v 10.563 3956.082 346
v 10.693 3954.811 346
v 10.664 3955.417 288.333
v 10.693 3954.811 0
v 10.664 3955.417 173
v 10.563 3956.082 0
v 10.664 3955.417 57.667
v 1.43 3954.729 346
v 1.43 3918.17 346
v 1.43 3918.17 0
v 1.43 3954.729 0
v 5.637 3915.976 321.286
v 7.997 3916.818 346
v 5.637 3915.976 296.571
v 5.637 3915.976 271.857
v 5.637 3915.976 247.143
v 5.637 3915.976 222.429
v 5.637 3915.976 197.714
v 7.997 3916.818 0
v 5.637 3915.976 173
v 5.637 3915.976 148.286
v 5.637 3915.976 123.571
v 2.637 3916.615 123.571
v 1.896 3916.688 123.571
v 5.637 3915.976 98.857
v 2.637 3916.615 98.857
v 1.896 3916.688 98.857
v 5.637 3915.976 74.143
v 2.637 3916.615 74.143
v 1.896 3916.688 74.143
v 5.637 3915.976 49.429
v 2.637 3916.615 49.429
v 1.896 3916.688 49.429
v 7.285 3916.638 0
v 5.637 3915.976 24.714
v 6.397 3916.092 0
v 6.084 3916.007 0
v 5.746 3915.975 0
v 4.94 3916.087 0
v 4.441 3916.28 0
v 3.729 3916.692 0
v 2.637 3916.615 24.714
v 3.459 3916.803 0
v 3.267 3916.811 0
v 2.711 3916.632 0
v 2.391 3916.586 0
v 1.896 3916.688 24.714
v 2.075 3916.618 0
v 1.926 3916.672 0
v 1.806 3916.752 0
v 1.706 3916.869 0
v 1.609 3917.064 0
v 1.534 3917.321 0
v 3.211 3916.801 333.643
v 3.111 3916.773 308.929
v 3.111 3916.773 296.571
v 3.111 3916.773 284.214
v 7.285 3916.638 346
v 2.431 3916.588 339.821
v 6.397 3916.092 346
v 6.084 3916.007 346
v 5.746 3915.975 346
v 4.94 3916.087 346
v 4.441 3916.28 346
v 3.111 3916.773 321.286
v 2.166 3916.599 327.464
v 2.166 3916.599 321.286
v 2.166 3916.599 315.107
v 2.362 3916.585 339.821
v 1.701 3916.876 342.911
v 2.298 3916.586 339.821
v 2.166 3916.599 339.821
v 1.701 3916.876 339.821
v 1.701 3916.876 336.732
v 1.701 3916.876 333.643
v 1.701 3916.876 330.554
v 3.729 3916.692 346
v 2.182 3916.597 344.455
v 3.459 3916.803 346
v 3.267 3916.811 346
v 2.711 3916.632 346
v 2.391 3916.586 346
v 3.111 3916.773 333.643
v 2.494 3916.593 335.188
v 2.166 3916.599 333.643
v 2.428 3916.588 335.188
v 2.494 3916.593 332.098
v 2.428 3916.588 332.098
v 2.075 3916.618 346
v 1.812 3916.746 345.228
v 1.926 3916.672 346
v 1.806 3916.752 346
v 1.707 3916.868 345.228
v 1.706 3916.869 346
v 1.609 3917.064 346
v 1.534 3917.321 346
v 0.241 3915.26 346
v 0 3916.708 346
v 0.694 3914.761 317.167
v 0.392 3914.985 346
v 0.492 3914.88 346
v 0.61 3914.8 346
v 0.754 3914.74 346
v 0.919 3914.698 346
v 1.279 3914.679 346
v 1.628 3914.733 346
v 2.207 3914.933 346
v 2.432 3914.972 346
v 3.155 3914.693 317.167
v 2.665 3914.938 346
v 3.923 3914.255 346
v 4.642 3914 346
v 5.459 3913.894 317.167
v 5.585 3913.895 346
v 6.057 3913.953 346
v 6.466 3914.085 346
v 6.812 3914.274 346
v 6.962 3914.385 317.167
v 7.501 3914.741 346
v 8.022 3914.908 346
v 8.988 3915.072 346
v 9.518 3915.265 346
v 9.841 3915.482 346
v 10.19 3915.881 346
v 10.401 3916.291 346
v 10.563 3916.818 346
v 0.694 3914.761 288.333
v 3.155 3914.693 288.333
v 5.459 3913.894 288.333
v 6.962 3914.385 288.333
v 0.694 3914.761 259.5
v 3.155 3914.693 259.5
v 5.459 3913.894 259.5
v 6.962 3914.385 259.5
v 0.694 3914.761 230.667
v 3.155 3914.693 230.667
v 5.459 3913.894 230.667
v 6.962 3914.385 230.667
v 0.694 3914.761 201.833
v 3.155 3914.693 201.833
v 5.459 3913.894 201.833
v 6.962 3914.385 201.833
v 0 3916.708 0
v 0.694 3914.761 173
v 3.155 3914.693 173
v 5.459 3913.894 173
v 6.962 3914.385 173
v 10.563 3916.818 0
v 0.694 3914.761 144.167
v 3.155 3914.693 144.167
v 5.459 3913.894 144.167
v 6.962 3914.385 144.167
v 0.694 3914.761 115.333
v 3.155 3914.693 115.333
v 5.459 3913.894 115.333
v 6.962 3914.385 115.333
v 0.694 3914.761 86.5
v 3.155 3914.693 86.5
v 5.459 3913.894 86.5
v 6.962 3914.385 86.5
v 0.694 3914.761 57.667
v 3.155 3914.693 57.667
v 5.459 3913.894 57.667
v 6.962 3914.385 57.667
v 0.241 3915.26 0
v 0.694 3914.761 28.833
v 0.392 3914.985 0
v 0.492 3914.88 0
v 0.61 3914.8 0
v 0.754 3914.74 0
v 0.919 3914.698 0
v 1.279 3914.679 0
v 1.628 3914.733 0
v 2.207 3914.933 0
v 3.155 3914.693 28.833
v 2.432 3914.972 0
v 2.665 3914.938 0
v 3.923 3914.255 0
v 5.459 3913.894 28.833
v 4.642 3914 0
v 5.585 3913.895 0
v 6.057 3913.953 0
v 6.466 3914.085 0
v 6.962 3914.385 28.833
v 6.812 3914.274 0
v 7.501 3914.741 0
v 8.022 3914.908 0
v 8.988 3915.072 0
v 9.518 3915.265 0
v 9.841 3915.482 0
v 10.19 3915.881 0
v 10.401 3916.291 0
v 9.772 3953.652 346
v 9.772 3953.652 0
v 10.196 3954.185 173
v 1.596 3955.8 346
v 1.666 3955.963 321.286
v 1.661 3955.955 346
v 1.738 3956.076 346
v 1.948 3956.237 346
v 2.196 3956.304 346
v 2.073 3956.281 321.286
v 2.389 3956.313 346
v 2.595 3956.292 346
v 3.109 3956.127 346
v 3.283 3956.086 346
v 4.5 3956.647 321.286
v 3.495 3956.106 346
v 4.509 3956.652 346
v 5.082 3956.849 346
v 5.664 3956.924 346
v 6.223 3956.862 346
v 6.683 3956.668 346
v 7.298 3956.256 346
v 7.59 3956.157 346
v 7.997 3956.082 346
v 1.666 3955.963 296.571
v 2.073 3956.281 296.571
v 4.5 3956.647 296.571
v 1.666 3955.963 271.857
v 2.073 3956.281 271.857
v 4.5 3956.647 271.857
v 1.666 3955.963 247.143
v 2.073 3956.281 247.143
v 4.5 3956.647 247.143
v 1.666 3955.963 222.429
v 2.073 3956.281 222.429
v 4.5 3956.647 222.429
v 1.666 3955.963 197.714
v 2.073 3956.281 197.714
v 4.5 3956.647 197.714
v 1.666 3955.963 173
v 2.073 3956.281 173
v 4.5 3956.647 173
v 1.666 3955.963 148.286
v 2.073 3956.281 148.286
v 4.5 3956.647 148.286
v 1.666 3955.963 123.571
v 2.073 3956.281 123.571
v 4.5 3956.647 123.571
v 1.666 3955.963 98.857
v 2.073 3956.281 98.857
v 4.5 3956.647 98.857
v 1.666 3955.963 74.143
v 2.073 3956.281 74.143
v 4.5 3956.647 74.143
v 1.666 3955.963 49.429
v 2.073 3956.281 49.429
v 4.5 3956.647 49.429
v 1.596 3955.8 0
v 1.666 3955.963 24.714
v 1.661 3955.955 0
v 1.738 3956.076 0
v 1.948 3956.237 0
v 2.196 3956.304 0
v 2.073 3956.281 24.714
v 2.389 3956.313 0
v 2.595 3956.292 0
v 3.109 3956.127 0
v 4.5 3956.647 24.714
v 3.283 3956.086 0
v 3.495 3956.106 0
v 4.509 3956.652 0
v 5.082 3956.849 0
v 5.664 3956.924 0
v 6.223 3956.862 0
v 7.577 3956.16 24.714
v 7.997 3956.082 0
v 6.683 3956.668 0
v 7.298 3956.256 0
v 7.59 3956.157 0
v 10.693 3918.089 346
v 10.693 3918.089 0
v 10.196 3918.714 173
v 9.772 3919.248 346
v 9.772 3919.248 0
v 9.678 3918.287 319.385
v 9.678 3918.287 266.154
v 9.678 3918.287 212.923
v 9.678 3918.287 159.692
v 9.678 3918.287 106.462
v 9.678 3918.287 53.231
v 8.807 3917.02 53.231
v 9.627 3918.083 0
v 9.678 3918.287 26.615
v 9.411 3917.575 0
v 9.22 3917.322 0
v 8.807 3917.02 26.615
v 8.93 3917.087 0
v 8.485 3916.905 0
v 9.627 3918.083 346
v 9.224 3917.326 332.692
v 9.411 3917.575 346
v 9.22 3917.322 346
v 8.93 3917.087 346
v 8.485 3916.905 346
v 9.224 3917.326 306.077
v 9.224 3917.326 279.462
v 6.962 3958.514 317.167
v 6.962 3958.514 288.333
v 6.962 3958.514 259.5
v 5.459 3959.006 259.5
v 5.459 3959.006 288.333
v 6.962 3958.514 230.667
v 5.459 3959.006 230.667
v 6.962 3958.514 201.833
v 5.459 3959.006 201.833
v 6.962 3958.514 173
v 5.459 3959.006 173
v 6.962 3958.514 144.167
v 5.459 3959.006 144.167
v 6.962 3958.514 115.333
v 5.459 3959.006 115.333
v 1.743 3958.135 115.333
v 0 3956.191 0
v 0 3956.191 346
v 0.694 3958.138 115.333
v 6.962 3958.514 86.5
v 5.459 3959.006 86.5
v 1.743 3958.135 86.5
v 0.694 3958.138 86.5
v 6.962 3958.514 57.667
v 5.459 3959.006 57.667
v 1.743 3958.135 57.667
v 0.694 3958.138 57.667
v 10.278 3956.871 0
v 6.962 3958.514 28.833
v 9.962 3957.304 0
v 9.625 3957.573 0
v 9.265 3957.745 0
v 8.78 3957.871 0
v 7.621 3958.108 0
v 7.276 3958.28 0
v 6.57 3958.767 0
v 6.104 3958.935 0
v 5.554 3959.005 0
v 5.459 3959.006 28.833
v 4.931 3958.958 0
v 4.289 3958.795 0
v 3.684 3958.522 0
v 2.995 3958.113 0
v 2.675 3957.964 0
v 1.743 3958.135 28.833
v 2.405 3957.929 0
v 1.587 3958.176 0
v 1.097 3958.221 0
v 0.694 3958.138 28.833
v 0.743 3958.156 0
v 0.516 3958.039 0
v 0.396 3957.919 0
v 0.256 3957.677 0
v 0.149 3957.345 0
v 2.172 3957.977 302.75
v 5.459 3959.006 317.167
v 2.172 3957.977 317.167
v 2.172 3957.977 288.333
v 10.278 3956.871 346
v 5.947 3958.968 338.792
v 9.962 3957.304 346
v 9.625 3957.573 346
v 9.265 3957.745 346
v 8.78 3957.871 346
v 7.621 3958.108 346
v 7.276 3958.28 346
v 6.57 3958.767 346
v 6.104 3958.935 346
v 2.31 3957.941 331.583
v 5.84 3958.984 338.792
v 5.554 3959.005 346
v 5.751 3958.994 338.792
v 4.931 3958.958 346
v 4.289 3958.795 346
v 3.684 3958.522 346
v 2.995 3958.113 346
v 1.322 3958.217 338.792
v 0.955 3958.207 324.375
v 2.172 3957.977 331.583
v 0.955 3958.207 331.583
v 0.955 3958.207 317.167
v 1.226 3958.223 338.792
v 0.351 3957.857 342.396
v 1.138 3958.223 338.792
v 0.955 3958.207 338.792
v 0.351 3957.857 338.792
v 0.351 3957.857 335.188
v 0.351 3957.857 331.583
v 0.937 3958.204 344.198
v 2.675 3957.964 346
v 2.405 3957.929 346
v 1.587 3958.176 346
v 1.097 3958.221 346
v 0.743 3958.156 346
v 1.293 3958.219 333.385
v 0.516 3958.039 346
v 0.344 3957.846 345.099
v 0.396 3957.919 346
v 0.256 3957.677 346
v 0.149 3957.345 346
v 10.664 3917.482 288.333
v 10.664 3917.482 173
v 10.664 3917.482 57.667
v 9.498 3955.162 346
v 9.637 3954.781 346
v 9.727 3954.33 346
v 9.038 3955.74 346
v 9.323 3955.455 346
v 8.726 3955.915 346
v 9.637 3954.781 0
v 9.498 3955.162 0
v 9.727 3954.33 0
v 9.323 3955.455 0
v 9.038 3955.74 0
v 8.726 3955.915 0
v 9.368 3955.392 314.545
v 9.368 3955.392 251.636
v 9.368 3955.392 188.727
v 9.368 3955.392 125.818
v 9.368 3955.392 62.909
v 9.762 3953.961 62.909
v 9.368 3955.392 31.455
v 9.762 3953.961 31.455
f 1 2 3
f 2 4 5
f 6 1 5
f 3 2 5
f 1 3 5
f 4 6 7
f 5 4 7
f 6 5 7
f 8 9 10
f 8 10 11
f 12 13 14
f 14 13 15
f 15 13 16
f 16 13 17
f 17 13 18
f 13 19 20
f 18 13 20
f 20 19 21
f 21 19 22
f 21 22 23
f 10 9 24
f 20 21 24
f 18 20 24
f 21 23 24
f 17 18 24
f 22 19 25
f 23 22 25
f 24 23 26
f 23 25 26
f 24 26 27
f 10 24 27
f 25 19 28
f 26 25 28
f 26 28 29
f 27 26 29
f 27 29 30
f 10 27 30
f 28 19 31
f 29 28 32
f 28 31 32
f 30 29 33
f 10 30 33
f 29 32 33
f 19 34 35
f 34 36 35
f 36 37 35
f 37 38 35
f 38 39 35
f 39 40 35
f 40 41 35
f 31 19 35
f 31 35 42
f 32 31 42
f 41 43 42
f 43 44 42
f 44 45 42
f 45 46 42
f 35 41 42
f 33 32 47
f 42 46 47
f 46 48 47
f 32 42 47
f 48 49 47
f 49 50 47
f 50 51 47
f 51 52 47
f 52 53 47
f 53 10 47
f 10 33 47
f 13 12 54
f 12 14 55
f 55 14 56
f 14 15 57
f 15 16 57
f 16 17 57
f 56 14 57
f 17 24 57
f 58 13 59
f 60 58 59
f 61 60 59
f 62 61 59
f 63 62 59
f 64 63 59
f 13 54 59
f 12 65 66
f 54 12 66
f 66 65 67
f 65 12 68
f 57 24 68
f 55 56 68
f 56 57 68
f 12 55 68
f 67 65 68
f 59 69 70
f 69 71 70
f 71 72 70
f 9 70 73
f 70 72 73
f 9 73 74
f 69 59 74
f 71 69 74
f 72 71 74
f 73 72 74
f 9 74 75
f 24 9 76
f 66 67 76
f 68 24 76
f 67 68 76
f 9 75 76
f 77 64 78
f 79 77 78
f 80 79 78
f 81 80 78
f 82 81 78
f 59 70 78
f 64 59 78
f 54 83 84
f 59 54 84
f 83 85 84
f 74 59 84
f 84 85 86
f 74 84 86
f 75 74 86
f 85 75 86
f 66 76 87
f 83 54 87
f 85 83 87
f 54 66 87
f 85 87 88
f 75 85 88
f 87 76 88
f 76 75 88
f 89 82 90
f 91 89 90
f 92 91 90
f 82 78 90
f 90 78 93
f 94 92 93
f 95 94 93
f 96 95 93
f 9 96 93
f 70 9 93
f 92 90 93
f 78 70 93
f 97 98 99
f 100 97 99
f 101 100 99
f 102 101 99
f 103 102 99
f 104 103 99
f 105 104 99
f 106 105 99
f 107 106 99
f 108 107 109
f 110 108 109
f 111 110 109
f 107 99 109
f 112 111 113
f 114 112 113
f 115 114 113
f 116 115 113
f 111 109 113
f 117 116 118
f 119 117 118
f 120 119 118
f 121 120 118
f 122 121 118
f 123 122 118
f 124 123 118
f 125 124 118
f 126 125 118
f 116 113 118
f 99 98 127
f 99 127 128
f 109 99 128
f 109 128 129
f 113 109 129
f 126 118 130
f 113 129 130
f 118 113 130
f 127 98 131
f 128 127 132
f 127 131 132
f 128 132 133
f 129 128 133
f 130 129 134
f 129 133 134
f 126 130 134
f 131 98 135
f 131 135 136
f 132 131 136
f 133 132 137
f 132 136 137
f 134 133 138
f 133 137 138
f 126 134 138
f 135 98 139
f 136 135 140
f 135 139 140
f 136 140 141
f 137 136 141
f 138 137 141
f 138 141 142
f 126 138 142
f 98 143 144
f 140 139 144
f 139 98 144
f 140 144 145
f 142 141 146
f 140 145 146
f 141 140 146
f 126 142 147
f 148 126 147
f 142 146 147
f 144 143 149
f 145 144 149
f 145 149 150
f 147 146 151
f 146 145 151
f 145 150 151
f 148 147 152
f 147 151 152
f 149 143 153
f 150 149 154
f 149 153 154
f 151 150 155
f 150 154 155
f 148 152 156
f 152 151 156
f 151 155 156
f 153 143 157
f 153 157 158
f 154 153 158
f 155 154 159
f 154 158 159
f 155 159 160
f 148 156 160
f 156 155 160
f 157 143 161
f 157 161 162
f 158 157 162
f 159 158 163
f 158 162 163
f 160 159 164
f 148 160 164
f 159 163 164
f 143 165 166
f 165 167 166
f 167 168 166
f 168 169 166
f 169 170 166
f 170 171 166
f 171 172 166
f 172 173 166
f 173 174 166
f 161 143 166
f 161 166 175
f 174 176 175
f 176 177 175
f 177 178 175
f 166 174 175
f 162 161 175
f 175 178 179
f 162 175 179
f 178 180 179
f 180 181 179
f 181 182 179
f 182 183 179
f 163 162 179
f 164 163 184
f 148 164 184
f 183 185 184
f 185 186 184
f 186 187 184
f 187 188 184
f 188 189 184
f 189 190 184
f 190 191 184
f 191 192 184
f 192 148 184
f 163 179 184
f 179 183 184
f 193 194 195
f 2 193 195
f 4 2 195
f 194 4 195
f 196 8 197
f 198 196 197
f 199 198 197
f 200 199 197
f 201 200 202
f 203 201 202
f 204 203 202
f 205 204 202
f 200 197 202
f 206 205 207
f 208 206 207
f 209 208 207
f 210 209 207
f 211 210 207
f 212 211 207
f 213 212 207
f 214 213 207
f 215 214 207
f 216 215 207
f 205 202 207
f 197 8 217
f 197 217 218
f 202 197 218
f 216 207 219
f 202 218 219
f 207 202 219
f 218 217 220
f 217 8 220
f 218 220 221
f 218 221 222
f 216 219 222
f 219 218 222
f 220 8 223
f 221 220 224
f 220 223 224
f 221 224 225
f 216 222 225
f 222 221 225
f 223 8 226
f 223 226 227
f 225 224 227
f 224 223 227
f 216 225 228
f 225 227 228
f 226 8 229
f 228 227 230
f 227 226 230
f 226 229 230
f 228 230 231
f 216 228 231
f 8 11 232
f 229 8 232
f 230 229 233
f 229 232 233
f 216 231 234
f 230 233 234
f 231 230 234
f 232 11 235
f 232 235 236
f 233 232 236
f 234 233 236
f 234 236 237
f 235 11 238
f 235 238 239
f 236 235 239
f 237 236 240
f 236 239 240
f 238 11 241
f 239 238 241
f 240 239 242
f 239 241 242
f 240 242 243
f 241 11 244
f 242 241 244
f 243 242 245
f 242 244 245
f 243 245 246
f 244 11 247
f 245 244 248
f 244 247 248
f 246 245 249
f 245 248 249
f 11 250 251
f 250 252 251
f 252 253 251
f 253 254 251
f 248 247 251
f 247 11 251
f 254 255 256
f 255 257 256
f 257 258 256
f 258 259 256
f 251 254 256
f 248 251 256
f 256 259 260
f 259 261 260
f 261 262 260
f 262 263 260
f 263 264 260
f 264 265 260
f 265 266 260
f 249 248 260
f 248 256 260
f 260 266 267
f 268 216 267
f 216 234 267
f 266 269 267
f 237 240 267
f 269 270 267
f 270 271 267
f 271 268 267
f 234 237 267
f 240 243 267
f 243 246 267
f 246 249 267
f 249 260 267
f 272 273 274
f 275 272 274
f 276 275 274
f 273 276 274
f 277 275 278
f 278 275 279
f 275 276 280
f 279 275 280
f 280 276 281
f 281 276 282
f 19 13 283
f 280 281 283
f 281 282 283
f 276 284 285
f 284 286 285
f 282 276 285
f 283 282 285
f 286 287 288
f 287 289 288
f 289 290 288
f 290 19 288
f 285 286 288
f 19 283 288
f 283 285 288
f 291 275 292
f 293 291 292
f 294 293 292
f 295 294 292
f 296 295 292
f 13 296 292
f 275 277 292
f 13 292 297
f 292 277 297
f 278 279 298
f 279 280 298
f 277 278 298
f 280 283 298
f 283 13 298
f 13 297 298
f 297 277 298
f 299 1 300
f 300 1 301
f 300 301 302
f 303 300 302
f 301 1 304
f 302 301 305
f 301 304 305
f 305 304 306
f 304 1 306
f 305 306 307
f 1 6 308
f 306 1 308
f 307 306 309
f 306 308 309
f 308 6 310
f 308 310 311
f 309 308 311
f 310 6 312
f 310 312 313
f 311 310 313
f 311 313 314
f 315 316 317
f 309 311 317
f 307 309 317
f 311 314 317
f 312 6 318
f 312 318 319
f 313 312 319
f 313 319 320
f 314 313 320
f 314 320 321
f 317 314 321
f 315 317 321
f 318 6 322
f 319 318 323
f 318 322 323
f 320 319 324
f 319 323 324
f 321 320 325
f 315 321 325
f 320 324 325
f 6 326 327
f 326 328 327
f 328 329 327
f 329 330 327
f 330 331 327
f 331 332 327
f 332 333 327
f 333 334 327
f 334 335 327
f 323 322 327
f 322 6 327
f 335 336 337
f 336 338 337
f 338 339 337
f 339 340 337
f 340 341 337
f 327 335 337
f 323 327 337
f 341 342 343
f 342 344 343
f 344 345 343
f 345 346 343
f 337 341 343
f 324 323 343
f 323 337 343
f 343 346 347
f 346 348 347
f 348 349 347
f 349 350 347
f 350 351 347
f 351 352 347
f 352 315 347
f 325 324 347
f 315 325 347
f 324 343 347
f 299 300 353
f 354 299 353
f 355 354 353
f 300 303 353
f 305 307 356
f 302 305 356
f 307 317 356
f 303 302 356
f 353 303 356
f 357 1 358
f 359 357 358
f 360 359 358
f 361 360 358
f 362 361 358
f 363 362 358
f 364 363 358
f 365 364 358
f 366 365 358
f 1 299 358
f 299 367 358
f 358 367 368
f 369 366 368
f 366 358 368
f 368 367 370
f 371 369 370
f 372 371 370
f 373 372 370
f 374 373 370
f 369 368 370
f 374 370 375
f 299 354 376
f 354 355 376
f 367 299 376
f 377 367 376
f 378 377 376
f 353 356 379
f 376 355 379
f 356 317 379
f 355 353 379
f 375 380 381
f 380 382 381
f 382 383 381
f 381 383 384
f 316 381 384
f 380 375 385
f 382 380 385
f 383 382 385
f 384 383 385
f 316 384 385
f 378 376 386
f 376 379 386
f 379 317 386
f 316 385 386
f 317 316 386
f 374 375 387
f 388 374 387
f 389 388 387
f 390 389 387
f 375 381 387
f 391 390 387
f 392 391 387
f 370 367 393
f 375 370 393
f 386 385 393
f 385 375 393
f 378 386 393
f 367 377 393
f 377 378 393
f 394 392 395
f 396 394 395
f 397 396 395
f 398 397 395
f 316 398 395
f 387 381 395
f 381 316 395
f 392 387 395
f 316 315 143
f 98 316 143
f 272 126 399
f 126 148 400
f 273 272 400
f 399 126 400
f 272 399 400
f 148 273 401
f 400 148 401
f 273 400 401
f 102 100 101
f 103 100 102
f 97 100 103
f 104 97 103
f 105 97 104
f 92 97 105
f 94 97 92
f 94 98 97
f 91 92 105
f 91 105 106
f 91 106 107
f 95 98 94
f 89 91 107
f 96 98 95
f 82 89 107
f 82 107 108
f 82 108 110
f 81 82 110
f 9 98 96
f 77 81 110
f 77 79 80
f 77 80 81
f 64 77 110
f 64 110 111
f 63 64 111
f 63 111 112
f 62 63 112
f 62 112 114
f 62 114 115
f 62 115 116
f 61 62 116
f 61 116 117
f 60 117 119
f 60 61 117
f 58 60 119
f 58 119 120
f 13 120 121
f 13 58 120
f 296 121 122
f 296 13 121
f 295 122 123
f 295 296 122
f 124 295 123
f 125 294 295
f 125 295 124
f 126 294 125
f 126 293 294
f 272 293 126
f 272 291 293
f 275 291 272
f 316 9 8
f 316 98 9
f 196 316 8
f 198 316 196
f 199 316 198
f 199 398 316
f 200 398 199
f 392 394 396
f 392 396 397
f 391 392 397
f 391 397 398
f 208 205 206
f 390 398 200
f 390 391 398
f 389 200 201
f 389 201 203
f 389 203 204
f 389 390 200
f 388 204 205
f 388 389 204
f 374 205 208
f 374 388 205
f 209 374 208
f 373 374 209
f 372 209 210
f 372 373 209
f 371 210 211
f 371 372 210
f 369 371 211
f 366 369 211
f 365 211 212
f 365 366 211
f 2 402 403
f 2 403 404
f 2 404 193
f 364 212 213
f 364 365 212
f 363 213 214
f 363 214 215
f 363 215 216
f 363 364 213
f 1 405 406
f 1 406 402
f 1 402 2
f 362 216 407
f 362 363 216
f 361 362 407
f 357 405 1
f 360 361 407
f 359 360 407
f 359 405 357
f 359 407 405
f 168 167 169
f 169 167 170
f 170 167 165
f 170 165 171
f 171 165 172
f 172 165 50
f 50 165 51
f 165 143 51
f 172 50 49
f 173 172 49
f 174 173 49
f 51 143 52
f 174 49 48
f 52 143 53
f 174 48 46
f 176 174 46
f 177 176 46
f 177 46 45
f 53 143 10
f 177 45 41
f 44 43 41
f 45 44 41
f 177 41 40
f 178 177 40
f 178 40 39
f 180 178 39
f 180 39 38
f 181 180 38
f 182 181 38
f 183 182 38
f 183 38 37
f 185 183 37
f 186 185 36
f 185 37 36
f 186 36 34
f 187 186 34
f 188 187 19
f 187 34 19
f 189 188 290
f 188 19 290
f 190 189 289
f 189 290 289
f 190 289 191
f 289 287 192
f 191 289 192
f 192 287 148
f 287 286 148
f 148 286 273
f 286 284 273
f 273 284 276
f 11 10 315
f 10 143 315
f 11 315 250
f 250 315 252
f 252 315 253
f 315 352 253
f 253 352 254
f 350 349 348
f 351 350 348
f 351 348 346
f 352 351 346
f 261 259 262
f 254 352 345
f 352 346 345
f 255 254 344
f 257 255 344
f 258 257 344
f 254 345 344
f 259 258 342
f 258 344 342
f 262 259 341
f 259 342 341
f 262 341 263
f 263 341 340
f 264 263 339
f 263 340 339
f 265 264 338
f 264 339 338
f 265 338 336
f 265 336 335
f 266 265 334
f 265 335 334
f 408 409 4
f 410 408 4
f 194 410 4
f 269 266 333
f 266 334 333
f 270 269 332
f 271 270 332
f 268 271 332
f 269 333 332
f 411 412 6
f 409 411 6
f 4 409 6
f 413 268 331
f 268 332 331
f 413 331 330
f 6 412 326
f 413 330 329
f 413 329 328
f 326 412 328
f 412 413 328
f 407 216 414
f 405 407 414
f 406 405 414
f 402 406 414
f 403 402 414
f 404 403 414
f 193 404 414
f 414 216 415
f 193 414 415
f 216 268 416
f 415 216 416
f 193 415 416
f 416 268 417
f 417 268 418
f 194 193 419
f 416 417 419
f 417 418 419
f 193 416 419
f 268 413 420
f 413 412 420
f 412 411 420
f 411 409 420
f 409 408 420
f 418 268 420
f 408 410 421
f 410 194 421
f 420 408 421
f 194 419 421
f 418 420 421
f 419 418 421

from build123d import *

# Parameters (mm, degrees)
BOSS_EXTRUDE1_DEPTH = 346


with BuildPart() as part:
    # Sketch1 → Boss-Extrude1 (new body)
    with BuildSketch(Plane.XY):
        with BuildLine():
            Line((1.430343878, 3918.17038545), (1.430343878, 3954.72901347))
            add(Edge.make_bspline(
                [(1.430343878, 3954.72901347), (1.492253744, 3955.777464486), (1.670742659, 3956.085303627), (1.952805311, 3956.243416154), (2.012188058, 3956.264605221), (2.256909987, 3956.328603169), (2.456399266, 3956.320672543), (2.757904339, 3956.259414864), (2.867475976, 3956.220539863), (3.0655829, 3956.142220977), (3.15726891, 3956.104553053), (3.353002763, 3956.075071328), (3.457565078, 3956.084802914), (3.826962952, 3956.236641407), (4.13936718, 3956.476934102), (4.679753676, 3956.732446606), (4.872375311, 3956.798700444), (5.259455237, 3956.891269903), (5.453877125, 3956.917683792), (5.821112383, 3956.92926878), (5.99223886, 3956.913589758), (6.380809615, 3956.829519875), (6.580504113, 3956.739636733), (6.800820646, 3956.589650728), (6.85125983, 3956.549497345), (7.057614936, 3956.384917414), (7.224473982, 3956.252870293), (7.694127073, 3956.129320115), (7.833489732, 3956.104363469), (7.996653054, 3956.081861553)],
                knots=[0, 0, 0, 0, 0.125, 0.125, 0.15625, 0.15625, 0.25, 0.25, 0.3125, 0.3125, 0.375, 0.375, 0.4375, 0.4375, 0.5625, 0.5625, 0.625, 0.625, 0.6875, 0.6875, 0.75, 0.75, 0.84375, 0.84375, 0.875, 0.875, 0.96875, 0.96875, 1, 1, 1, 1], degree=3))
            add(Edge.make_bspline(
                [(7.996653054, 3956.081861553), (8.088130688, 3956.069320908), (8.272759414, 3956.044010205), (8.548043297, 3955.98416982), (8.80734904, 3955.887619995), (9.114434379, 3955.705965873), (9.393499143, 3955.395178677), (9.581191859, 3954.993856883), (9.667993716, 3954.674443569), (9.713013038, 3954.432056806), (9.743778183, 3954.209962946), (9.766008001, 3953.938475631), (9.770007737, 3953.751998289), (9.772158651, 3953.651717495)],
                knots=[0, 0, 0, 0, 0.060950833, 0.123016678, 0.186644705, 0.247150337, 0.371687479, 0.497525343, 0.623449375, 0.683912366, 0.749156722, 0.865105526, 1, 1, 1, 1], degree=3))
            add(Edge.make_bspline(
                [(9.772158651, 3953.651717495), (9.902408791, 3953.815701891), (10.041613322, 3953.99095983), (10.350614598, 3954.379991179), (10.515877695, 3954.588056746), (10.692633126, 3954.810591115)],
                knots=[0, 0, 0, 0, 0.5, 0.5, 1, 1, 1, 1], degree=3))
            add(Edge.make_bspline(
                [(10.692633126, 3954.810591115), (10.691913281, 3954.862178833), (10.690503499, 3954.963210999), (10.684715317, 3955.117285928), (10.676302075, 3955.267777636), (10.659709804, 3955.478316933), (10.62998225, 3955.746722565), (10.584575759, 3955.973569096), (10.562899516, 3956.081861553)],
                knots=[0, 0, 0, 0, 0.133575651, 0.261601747, 0.383626033, 0.499198607, 0.760926415, 1, 1, 1, 1], degree=3))
            add(Edge.make_bspline(
                [(10.562899516, 3956.081861553), (10.216850212, 3957.618133962), (9.250723887, 3957.808490842), (8.406599882, 3957.92725494), (8.292912495, 3957.941948908), (7.466350409, 3958.083027006), (7.217801541, 3958.312264006), (6.889348881, 3958.571511488), (6.81435089, 3958.626610793), (6.402376678, 3958.879219503), (5.974893614, 3959.011194859), (5.200662558, 3959.003043812), (4.92380844, 3958.96768319), (4.373451983, 3958.834301949), (4.10034642, 3958.735210231), (3.596642827, 3958.481718757), (3.364114577, 3958.332529644), (2.945705944, 3958.080719754), (2.760220812, 3957.979286242), (2.283192997, 3957.874374952), (2.059716703, 3958.037572792), (1.425981171, 3958.231975183), (1.028740794, 3958.270897767), (0.359991506, 3958.004962063), (0.088038092, 3957.682417032), (0, 3956.191481358)],
                knots=[0, 0, 0, 0, 0.09375, 0.09375, 0.109375, 0.109375, 0.21875, 0.21875, 0.25, 0.25, 0.375, 0.375, 0.4375, 0.4375, 0.5, 0.5, 0.5625, 0.5625, 0.625, 0.625, 0.75, 0.75, 0.875, 0.875, 1, 1, 1, 1], degree=3))
            Line((0, 3956.191481358), (0, 3916.707917562))
            add(Edge.make_bspline(
                [(0, 3916.707917562), (0.088038092, 3915.216981887), (0.359991506, 3914.894436857), (1.028740794, 3914.628501152), (1.425981171, 3914.667423737), (2.059716703, 3914.861826128), (2.283192997, 3915.025023968), (2.760220812, 3914.920112678), (2.945705944, 3914.818679166), (3.364114577, 3914.566869275), (3.596642827, 3914.417680163), (4.10034642, 3914.164188689), (4.373451983, 3914.06509697), (4.92380844, 3913.931715729), (5.200662558, 3913.896355108), (5.974893614, 3913.888204061), (6.402376678, 3914.020179417), (6.81435089, 3914.272788127), (6.889348881, 3914.327887431), (7.217801541, 3914.587134913), (7.466350409, 3914.816371914), (8.292912495, 3914.957450011), (8.406599882, 3914.97214398), (9.250723887, 3915.090908078), (10.216850212, 3915.281264957), (10.562899516, 3916.817537367)],
                knots=[0, 0, 0, 0, 0.125, 0.125, 0.25, 0.25, 0.375, 0.375, 0.4375, 0.4375, 0.5, 0.5, 0.5625, 0.5625, 0.625, 0.625, 0.75, 0.75, 0.78125, 0.78125, 0.890625, 0.890625, 0.90625, 0.90625, 1, 1, 1, 1], degree=3))
            add(Edge.make_bspline(
                [(10.562899516, 3916.817537367), (10.574166654, 3916.870469087), (10.597285266, 3916.979077668), (10.624349071, 3917.143363024), (10.647212021, 3917.312529496), (10.669477274, 3917.52761428), (10.687102378, 3917.792322091), (10.690731297, 3917.986856854), (10.692633126, 3918.088807804)],
                knots=[0, 0, 0, 0, 0.116530115, 0.239103705, 0.367349581, 0.500883136, 0.738424956, 1, 1, 1, 1], degree=3))
            add(Edge.make_bspline(
                [(10.692633126, 3918.088807804), (10.515877695, 3918.311342173), (10.350614598, 3918.51940774), (10.041613322, 3918.90843909), (9.902408791, 3919.083697028), (9.772158651, 3919.247681425)],
                knots=[0, 0, 0, 0, 0.5, 0.5, 1, 1, 1, 1], degree=3))
            add(Edge.make_bspline(
                [(9.772158651, 3919.247681425), (9.771365289, 3919.196873909), (9.769824671, 3919.09821149), (9.762690765, 3918.943687255), (9.752032923, 3918.792605675), (9.736127422, 3918.633823813), (9.712996418, 3918.467321321), (9.66800734, 3918.224984421), (9.58118816, 3917.905535849), (9.393500286, 3917.504221803), (9.114442807, 3917.193443211), (8.807363306, 3917.011784716), (8.54805793, 3916.915232419), (8.272759456, 3916.855388689), (8.088130702, 3916.830078003), (7.996653054, 3916.817537367)],
                knots=[0, 0, 0, 0, 0.069471261, 0.134905289, 0.195584026, 0.250878315, 0.316108883, 0.376579777, 0.502497916, 0.62832989, 0.752861203, 0.813353993, 0.87698908, 0.939052019, 1, 1, 1, 1], degree=3))
            add(Edge.make_bspline(
                [(7.996653054, 3916.817537367), (7.833489732, 3916.79503545), (7.694127073, 3916.770078804), (7.224473982, 3916.646528627), (7.057614936, 3916.514481505), (6.85125983, 3916.349901574), (6.800820646, 3916.309748192), (6.580504113, 3916.159762187), (6.380809615, 3916.069879045), (5.99223886, 3915.985809162), (5.821112383, 3915.97013014), (5.453877125, 3915.981715128), (5.259455237, 3916.008129016), (4.872375311, 3916.100698475), (4.679753676, 3916.166952313), (4.13936718, 3916.422464817), (3.826962952, 3916.662757512), (3.457565078, 3916.814596005), (3.353002763, 3916.824327592), (3.15726891, 3916.794845866), (3.0655829, 3916.757177942), (2.867475976, 3916.678859056), (2.757904339, 3916.639984056), (2.456399266, 3916.578726377), (2.256909987, 3916.570795751), (2.012188058, 3916.634793698), (1.952805311, 3916.655982766), (1.670742659, 3916.814095293), (1.492253744, 3917.121934434), (1.430343878, 3918.17038545)],
                knots=[0, 0, 0, 0, 0.03125, 0.03125, 0.125, 0.125, 0.15625, 0.15625, 0.25, 0.25, 0.3125, 0.3125, 0.375, 0.375, 0.4375, 0.4375, 0.5625, 0.5625, 0.625, 0.625, 0.6875, 0.6875, 0.75, 0.75, 0.84375, 0.84375, 0.875, 0.875, 1, 1, 1, 1], degree=3))
        make_face()
    extrude(amount=BOSS_EXTRUDE1_DEPTH)


solid = part.part
